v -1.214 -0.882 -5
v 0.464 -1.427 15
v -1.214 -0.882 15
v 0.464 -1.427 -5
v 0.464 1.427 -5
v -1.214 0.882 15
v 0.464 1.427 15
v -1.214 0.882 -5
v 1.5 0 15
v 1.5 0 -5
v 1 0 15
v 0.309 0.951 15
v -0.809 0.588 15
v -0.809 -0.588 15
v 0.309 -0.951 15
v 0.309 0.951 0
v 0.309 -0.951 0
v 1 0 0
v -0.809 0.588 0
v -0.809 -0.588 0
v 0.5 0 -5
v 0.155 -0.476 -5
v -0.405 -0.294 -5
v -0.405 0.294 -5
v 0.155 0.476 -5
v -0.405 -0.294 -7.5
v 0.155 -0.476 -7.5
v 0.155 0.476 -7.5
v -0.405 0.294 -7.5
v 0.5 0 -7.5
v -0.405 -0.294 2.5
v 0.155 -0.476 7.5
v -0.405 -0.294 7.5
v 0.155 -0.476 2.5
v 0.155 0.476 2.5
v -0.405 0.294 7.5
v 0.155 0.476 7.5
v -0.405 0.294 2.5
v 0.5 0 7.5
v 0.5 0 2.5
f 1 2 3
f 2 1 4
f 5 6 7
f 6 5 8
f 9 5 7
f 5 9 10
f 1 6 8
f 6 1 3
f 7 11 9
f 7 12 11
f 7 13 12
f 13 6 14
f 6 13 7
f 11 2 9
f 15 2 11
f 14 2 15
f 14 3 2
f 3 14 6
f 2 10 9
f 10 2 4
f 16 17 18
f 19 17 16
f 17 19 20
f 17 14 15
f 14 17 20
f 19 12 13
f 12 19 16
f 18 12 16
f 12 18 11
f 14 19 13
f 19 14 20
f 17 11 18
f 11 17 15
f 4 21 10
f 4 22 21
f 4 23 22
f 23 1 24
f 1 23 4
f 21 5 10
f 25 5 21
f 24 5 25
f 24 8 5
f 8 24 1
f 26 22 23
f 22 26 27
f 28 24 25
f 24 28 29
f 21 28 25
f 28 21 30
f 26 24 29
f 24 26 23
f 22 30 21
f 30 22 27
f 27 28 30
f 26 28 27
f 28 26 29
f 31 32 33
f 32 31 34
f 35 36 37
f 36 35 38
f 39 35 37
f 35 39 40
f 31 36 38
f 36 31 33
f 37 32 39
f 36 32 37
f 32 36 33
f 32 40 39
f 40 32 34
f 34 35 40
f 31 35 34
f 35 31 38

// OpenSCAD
// Parameters
length = 15; //[8:30:1]
forced_id = 0; //[0:10:1]
center = 1; //[0:1:1]
original_id = 2; //[1:4:0.1]
original_od = 3; //[1.5:6:0.1]
id = 2; //[1:6:0.1]
od = 3; //[1.5:10:0.1]
eps_overlap = 0.8; //[0.2:2:0.1]

// Tubing - complete geometry
module tubing() {
  color([0.85, 0.85, 0.8]) {
    difference() {
      cylinder(h=length, r=od/2, center=center);
      translate([0, 0, 0])
        cylinder(h=length + 2*eps_overlap, r=id/2, center=center);
    }
  }
}

// Sleeved Resistor - complete geometry
module sleeved_resistor() {
  color([0.2, 0.2, 0.2]) {
    // Resistor body
    translate([0, 0, -2.5])
      cylinder(h=5, r=1.5, center=true);
    // Leads
    translate([0, 0, -7.5])
      cylinder(h=5, r=0.5, center=false);
    translate([0, 0, 2.5])
      cylinder(h=5, r=0.5, center=false);
  }
}

// Assembly
module assembly() {
  tubing();
  translate([0, 0, 0])
    sleeved_resistor();
}

assembly();
